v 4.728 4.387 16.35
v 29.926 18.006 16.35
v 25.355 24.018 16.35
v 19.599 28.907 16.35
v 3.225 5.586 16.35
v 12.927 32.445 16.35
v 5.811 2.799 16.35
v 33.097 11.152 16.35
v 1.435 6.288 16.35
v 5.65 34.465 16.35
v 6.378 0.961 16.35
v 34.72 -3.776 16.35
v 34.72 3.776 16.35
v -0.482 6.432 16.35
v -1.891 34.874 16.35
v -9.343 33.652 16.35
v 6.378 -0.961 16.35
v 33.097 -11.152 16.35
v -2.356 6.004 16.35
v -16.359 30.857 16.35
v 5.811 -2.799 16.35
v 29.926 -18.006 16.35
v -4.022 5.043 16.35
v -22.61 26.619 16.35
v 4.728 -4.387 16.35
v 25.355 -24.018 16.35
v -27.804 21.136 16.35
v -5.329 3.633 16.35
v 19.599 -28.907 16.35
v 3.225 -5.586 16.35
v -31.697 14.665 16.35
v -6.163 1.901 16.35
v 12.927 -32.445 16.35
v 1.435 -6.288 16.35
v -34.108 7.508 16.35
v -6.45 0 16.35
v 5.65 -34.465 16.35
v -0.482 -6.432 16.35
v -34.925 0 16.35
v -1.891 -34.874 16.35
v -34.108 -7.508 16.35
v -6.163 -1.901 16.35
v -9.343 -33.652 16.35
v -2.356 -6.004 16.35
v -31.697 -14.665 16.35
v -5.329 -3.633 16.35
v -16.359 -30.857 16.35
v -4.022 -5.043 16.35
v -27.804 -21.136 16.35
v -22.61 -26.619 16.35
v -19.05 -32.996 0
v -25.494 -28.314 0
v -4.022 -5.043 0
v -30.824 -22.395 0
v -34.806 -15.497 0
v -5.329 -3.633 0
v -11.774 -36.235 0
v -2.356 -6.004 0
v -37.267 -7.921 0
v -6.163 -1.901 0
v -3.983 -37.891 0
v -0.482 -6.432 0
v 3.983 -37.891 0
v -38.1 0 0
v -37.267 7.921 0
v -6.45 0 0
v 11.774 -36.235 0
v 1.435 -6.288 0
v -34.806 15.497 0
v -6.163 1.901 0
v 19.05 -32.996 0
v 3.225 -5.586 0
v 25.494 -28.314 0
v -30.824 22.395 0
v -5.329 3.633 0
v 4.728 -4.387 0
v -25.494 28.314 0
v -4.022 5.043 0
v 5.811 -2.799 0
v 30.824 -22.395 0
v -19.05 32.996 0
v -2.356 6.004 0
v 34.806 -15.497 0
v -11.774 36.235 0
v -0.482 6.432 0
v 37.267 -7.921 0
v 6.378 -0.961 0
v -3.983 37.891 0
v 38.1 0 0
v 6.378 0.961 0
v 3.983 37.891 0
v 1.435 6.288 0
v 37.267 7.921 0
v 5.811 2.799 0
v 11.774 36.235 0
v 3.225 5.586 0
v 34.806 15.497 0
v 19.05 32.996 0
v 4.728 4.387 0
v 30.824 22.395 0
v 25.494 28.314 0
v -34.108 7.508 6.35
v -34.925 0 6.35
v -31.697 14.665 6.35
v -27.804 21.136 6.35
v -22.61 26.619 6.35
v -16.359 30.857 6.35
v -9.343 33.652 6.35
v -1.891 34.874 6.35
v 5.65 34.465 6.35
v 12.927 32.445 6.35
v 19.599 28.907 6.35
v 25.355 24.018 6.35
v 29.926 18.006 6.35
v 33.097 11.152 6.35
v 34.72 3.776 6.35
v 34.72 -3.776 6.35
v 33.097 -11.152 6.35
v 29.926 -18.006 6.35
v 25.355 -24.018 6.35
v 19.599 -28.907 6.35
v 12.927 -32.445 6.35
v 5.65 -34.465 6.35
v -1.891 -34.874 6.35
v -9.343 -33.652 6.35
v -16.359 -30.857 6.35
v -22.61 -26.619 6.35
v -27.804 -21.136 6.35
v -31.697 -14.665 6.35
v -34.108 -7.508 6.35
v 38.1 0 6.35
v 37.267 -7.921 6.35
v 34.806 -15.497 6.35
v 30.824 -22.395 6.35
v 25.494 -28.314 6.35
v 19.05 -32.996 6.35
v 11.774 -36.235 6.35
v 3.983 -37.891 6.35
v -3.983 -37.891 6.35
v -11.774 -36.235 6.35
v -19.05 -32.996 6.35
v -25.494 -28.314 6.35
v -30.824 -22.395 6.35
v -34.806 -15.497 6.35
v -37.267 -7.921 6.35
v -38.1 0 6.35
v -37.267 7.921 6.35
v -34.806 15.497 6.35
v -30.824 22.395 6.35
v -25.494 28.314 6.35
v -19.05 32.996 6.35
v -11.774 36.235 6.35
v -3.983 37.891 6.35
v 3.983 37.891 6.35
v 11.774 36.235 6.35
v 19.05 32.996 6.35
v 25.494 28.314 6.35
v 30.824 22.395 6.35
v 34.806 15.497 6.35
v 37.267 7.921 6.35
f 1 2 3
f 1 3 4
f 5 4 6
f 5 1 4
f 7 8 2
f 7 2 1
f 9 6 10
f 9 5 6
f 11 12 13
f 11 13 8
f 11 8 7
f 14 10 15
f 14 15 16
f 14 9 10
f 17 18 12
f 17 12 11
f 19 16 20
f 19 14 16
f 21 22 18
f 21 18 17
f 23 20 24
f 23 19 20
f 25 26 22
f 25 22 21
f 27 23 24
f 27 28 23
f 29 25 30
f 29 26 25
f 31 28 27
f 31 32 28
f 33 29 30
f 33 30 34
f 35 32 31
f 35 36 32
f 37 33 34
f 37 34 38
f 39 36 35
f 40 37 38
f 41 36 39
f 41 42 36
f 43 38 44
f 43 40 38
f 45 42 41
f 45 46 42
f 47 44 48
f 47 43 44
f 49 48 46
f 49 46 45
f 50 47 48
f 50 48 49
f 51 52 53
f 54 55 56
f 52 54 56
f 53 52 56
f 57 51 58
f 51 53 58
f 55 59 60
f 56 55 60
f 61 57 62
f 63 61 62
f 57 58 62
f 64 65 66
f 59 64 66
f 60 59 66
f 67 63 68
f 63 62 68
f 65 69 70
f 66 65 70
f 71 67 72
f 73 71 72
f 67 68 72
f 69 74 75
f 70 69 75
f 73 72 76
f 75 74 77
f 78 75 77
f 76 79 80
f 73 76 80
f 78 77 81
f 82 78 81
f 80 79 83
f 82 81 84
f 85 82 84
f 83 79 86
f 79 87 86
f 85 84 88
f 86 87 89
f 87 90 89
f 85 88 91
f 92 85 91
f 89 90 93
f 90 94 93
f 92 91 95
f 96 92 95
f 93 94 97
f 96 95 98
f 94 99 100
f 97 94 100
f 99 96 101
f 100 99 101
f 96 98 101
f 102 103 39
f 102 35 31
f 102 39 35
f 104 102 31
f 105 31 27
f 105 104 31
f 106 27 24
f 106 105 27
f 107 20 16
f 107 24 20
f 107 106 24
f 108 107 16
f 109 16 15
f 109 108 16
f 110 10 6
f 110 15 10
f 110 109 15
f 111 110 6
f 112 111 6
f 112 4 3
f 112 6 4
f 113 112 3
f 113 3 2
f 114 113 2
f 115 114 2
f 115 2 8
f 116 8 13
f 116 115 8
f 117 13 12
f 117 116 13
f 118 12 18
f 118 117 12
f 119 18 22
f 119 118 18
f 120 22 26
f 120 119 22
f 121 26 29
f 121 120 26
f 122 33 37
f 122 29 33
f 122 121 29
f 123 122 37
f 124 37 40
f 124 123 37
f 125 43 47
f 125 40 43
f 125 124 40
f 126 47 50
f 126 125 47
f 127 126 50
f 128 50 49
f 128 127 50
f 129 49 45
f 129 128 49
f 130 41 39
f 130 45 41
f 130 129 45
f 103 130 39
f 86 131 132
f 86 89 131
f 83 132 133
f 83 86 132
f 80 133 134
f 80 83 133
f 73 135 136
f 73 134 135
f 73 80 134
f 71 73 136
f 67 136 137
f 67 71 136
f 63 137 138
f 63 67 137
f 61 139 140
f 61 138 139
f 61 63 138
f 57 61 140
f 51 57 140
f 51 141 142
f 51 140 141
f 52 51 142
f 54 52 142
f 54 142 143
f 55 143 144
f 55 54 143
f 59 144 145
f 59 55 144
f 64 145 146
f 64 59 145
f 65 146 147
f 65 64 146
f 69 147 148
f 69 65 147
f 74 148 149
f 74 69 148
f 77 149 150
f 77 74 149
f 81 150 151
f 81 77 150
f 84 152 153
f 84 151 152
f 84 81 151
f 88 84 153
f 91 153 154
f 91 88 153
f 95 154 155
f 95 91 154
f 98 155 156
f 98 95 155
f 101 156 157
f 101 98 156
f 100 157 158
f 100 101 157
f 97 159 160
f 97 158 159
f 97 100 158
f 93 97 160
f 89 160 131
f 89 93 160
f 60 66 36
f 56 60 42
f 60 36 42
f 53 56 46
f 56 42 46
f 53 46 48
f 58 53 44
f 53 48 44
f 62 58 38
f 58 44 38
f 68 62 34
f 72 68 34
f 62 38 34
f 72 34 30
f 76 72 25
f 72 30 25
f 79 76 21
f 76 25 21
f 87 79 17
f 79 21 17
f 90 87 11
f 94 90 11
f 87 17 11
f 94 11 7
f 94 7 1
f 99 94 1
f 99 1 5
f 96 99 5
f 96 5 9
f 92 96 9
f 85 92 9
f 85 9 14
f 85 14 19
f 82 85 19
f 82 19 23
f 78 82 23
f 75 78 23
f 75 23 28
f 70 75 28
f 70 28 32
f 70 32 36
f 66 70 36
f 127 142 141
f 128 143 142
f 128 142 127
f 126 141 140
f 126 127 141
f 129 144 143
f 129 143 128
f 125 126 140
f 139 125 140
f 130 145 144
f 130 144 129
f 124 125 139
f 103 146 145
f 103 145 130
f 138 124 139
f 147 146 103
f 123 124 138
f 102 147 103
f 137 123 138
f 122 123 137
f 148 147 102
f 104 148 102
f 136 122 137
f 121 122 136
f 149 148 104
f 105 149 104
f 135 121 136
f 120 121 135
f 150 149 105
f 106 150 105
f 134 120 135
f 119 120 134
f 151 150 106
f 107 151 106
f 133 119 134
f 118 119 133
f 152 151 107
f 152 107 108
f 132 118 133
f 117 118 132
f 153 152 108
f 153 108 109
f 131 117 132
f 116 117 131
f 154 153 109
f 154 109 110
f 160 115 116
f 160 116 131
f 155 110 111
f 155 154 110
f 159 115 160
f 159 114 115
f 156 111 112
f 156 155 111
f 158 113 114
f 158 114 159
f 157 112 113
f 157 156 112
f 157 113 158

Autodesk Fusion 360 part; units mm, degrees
sketch "Roller_End_Cap_Outter" plane through (0, 0, 0) normal (0, 0, 1) x (1, 0, 0)
  circle A0 centre (0, 0) radius 38.1
  dimension "d2" = 76.2
extrude "Extrude1" add sketch "Roller_End_Cap_Outter" along normal blind 6.35
sketch "Roller_End_Cap_Inner" plane through (0, 0, 6.35) normal (0, 0, 1) x (-1, 0, 0)
  circle A0 centre (0, 0) radius 38.1
  circle A1 centre (0, 0) radius 34.925
  dimension "d7" = 69.85
extrude "Extrude3" add sketch "Roller_End_Cap_Inner" along normal blind 10 contours A1
sketch "Shaft Hole" plane through (0, 0, 16.35) normal (0, 0, 1) x (-1, 0, 0)
  circle A0 centre (0, 0) radius 34.925
  circle A1 centre (0, 0) radius 6.45
  dimension "d10" = 12.9
extrude "Extrude4" cut sketch "Shaft Hole" against normal through all contours A1
